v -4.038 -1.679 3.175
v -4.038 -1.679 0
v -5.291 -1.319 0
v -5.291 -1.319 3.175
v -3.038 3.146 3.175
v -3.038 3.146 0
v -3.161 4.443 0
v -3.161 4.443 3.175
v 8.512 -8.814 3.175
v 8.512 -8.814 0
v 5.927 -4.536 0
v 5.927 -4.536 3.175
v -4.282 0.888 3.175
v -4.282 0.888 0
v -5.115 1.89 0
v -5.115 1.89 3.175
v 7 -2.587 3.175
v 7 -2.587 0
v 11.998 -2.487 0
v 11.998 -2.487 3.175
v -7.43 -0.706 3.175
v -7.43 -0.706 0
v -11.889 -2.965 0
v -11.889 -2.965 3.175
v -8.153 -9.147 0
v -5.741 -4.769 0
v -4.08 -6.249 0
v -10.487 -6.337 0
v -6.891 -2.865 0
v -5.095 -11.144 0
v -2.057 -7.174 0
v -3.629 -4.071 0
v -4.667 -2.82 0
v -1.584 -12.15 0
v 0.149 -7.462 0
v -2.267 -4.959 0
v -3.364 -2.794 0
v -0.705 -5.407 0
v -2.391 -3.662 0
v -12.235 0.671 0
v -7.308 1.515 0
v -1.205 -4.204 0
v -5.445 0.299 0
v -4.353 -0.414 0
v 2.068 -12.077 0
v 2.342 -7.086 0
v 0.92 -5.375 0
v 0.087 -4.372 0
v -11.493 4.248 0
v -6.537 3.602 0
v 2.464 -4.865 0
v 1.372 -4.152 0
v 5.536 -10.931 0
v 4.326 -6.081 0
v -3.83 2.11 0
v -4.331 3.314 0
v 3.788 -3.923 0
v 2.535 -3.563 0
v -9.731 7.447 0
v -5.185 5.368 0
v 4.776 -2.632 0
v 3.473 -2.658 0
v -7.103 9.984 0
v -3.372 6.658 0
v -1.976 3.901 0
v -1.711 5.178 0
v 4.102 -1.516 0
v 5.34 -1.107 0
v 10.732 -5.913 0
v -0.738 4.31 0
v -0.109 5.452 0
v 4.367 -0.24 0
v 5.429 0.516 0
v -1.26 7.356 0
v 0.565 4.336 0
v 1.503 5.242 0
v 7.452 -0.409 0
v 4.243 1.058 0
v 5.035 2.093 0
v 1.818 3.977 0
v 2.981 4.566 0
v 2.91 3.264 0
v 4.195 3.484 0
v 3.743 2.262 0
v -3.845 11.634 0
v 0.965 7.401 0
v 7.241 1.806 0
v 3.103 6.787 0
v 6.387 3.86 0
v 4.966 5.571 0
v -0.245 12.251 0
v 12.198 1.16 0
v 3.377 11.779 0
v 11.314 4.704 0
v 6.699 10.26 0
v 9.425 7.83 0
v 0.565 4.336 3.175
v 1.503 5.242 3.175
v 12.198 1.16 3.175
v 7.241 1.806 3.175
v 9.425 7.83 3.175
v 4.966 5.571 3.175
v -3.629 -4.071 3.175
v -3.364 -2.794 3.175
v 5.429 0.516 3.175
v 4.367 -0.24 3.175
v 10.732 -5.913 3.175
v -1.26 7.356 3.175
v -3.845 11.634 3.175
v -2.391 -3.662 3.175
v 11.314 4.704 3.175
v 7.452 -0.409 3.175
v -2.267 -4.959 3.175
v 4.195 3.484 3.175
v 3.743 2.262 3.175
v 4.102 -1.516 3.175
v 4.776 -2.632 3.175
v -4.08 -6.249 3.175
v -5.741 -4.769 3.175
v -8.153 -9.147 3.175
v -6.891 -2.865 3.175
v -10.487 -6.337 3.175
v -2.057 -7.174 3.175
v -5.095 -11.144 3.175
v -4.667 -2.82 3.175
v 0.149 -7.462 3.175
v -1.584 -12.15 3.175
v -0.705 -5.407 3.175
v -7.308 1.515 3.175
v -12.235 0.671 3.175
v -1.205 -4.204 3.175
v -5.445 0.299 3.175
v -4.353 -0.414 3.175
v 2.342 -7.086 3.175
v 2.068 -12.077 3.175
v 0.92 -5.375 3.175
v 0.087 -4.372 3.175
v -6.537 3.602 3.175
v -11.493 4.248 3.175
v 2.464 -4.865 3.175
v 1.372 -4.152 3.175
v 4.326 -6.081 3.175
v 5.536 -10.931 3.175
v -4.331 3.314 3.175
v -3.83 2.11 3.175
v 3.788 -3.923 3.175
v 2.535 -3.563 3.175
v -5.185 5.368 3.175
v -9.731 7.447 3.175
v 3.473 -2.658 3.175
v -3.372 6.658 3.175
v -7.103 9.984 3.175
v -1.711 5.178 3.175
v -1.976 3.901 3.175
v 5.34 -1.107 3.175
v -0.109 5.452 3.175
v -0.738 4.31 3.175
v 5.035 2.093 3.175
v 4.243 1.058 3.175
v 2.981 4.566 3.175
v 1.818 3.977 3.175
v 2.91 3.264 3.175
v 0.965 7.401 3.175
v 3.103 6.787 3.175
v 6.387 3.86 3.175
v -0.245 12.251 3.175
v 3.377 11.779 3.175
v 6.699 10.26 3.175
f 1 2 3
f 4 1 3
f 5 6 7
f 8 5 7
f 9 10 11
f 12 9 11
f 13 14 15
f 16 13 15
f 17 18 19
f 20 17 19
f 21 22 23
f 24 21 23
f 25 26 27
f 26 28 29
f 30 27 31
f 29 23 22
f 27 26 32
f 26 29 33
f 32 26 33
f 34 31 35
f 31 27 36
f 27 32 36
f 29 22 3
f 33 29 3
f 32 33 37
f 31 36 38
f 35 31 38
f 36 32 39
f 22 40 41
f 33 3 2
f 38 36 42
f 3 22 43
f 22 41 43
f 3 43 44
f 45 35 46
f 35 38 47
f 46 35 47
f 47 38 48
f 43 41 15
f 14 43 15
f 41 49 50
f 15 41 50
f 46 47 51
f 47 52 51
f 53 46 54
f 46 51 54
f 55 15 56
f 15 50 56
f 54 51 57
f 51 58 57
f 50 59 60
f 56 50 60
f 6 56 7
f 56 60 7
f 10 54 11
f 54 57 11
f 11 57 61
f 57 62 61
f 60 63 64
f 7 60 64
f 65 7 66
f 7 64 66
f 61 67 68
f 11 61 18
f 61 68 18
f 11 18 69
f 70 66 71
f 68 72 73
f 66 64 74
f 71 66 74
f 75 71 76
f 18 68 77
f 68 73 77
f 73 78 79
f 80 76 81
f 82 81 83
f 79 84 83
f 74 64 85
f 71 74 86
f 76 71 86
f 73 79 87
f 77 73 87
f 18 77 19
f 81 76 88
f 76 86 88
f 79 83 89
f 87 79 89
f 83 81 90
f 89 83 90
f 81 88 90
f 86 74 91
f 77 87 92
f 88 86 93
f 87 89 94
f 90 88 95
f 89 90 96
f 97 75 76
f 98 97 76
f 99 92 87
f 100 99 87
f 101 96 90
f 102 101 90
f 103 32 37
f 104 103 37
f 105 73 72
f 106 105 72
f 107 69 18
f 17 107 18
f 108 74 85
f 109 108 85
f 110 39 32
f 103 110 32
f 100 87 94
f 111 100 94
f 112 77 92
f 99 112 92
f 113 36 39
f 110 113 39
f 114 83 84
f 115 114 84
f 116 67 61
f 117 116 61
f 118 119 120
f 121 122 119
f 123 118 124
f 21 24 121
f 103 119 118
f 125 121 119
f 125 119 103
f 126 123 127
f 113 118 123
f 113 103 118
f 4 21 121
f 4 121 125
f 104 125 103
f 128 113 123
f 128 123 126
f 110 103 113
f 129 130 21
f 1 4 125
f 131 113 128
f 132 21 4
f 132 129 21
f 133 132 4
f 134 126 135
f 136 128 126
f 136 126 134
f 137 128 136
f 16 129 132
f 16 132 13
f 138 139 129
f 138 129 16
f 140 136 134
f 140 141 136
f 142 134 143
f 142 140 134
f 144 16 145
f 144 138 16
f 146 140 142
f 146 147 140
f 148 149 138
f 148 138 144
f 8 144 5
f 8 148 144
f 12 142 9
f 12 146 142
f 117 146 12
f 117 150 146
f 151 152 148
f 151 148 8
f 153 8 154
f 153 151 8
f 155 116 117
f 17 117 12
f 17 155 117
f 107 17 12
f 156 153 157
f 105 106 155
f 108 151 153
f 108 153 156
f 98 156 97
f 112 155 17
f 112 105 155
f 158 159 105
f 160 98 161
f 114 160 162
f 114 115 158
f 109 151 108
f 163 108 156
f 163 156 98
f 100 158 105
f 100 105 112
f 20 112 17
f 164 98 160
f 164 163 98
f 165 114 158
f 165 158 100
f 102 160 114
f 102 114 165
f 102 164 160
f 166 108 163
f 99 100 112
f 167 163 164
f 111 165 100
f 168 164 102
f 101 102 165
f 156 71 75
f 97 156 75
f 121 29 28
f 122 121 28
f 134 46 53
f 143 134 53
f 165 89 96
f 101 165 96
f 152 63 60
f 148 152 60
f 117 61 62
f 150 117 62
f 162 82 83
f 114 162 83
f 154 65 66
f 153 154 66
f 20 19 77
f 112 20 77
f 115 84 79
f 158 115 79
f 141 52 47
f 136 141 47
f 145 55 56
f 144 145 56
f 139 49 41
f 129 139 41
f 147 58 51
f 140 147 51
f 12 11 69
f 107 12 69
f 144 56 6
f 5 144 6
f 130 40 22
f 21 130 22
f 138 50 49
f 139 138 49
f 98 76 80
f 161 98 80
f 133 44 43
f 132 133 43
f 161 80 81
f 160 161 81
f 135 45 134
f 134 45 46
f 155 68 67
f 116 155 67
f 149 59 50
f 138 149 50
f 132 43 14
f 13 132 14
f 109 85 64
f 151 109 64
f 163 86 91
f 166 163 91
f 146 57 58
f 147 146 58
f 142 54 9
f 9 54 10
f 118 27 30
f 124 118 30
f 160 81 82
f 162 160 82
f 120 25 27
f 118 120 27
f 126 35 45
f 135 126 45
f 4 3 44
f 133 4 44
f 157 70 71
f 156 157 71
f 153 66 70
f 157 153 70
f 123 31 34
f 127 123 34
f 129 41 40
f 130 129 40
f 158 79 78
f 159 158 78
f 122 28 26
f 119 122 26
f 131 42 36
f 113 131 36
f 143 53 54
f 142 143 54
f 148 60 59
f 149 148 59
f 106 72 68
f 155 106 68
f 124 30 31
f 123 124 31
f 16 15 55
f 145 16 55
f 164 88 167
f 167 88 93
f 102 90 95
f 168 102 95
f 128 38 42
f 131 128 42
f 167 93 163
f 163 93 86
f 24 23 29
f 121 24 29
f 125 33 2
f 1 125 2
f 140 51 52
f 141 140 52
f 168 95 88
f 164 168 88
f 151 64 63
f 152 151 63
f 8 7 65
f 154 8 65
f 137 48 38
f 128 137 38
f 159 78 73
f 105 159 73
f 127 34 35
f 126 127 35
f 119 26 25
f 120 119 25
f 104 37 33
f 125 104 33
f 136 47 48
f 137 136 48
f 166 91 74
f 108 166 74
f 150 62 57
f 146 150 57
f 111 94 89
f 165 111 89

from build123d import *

# Parameters (mm, degrees)
F1_DEPTH = 3.175


with BuildPart() as f1:
    # F0 (on Top) → F1 (new body)
    with BuildSketch(Plane.XY):
        Polygon((-10.4870628137, -6.3373573051), (-5.7407955294, -4.7688256549), (-4.6671820235, -2.8203893327), (-6.8913841292, -2.8648309238), align=None)
        Polygon((-8.1531831795, -9.14692233), (-4.0801120539, -6.2490892989), (-3.6285078717, -4.0707633994), (-5.7407955294, -4.7688256549), align=None)
        Polygon((-4.0801120539, -6.2490892989), (-5.0948574403, -11.1437431653), (-2.056892717, -7.174093935), (-2.267424872, -4.9594322738), align=None)
        Polygon((-0.704871222, -5.4074338266), (-2.056892717, -7.174093935), (-1.583831259, -12.1503935168), (0.1490905642, -7.461648842), align=None)
        Polygon((2.4637240027, -4.8648995948), (2.3418264946, -7.0862035045), (5.5359375832, -10.9313301636), (4.326480864, -6.0811178883), align=None)
        Polygon((3.7882219865, -3.9225703575), (4.326480864, -6.0811178883), (8.512057538, -8.8139355875), (5.9267084221, -4.5356982612), align=None)
        Polygon((4.7761198224, -2.6317035301), (5.9267084221, -4.5356982612), (10.7318438259, -5.9133841552), (7.0003219281, -2.587261939), align=None)
        Polygon((5.3396384525, -1.106998295), (7.0003219281, -2.587261939), (11.998058694, -2.4874025902), (7.4519261103, -0.4089360395), align=None)
        Polygon((5.4287067735, 0.5160685966), (7.4519261103, -0.4089360395), (12.1981933945, 1.1595956107), (7.2413939554, 1.8057256217), align=None)
        Polygon((5.0354106741, 2.0932805287), (7.2413939554, 1.8057256217), (11.314465081, 4.7035586528), (6.3874321692, 3.8599406371), align=None)
        Polygon((4.1946962388, 3.4844952996), (6.3874321692, 3.8599406371), (9.4253968924, 7.8295898674), (4.965919004, 5.5711829878), align=None)
        Polygon((2.9812646346, 4.5660973716), (4.965919004, 5.5711829878), (6.6988408272, 10.2599276626), (3.1031621427, 6.7874012813), align=None)
        Polygon((0.964675707, 7.400529185), (1.5029345845, 5.2419816542), (3.1031621427, 6.7874012813), (3.3770633571, 11.7786258601), align=None)
        Polygon((-0.2447810122, 12.2507414603), (-1.2595263986, 7.3560875939), (-0.1089377989, 5.4520928628), (0.964675707, 7.400529185), align=None)
        Polygon((-3.3718140564, 6.6580253384), (-1.7111305808, 5.1777616944), (-1.2595263986, 7.3560875939), (-3.8448755144, 11.6343249202), align=None)
        Polygon((-7.1033359542, 9.9841475546), (-5.1845012383, 5.3683683133), (-3.1612819015, 4.4433636772), (-3.3718140564, 6.6580253384), align=None)
        Polygon((-9.730633822, 7.446834864), (-6.5365227334, 3.6017082049), (-4.3305394521, 3.3141532979), (-5.1845012383, 5.3683683133), align=None)
        Polygon((-11.4933221725, 4.2478382159), (-7.3077454986, 1.5150205167), (-5.1150095682, 1.8904658542), (-6.5365227334, 3.6017082049), align=None)
        Polygon((-12.2347784104, 0.671402501), (-7.4296430067, -0.706283393), (-5.4449886373, 0.2988022231), (-7.3077454986, 1.5150205167), align=None)
        Polygon((-11.8891208951, -2.9646902726), (-6.8913841292, -2.8648309238), (-5.291156571, -1.3194112967), (-7.4296430067, -0.706283393), align=None)
        Polygon((-6.8913841292, -2.8648309238), (-4.6671820235, -2.8203893327), (-4.0380858348, -1.6786806476), (-5.291156571, -1.3194112967), align=None)
        Polygon((-5.7407955294, -4.7688256549), (-3.6285078717, -4.0707633994), (-3.3638852041, -2.794348271), (-4.6671820235, -2.8203893327), align=None)
        Polygon((-3.6285078717, -4.0707633994), (-4.0801120539, -6.2490892989), (-2.267424872, -4.9594322738), (-2.3907886109, -3.6617257877), align=None)
        Polygon((-2.267424872, -4.9594322738), (-2.056892717, -7.174093935), (-0.704871222, -5.4074338266), (-1.2052599578, -4.2037428989), align=None)
        Polygon((0.0873613318, -4.3722390058), (-0.704871222, -5.4074338266), (0.1490905642, -7.461648842), (0.9203133294, -5.3749611537), align=None)
        Polygon((0.9203133294, -5.3749611537), (0.1490905642, -7.461648842), (2.0679252801, -12.0774280832), (2.3418264946, -7.0862035045), align=None)
        Polygon((1.3722201837, -4.1522424897), (0.9203133294, -5.3749611537), (2.3418264946, -7.0862035045), (2.4637240027, -4.8648995948), align=None)
        Polygon((2.5351512503, -3.5633010067), (2.4637240027, -4.8648995948), (4.326480864, -6.0811178883), (3.7882219865, -3.9225703575), align=None)
        Polygon((3.4728230031, -2.6577445918), (3.7882219865, -3.9225703575), (5.9267084221, -4.5356982612), (4.7761198224, -2.6317035301), align=None)
        Polygon((4.1019191917, -1.5160359067), (4.7761198224, -2.6317035301), (7.0003219281, -2.587261939), (5.3396384525, -1.106998295), align=None)
        Polygon((4.3665418593, -0.2396207783), (5.3396384525, -1.106998295), (7.4519261103, -0.4089360395), (5.4287067735, 0.5160685966), align=None)
        Polygon((4.2431781203, 1.0580857079), (5.4287067735, 0.5160685966), (7.2413939554, 1.8057256217), (5.0354106741, 2.0932805287), align=None)
        Polygon((3.7427893845, 2.2617766355), (5.0354106741, 2.0932805287), (6.3874321692, 3.8599406371), (4.1946962388, 3.4844952996), align=None)
        Polygon((2.9098373869, 3.2644987835), (4.1946962388, 3.4844952996), (4.965919004, 5.5711829878), (2.9812646346, 4.5660973716), align=None)
        Polygon((1.5029345845, 5.2419816542), (1.8183335679, 3.9771558885), (2.9812646346, 4.5660973716), (3.1031621427, 6.7874012813), align=None)
        Polygon((-0.1089377989, 5.4520928628), (0.5652628318, 4.3364252394), (1.5029345845, 5.2419816542), (0.964675707, 7.400529185), align=None)
        Polygon((-1.2595263986, 7.3560875939), (-1.7111305808, 5.1777616944), (-0.7380339876, 4.3103841777), (-0.1089377989, 5.4520928628), align=None)
        Polygon((-3.1612819015, 4.4433636772), (-1.9757532484, 3.9013465659), (-1.7111305808, 5.1777616944), (-3.3718140564, 6.6580253384), align=None)
        Polygon((-5.1845012383, 5.3683683133), (-4.3305394521, 3.3141532979), (-3.0379181626, 3.145657191), (-3.1612819015, 4.4433636772), align=None)
        Polygon((-6.5365227334, 3.6017082049), (-5.1150095682, 1.8904658542), (-3.8301507163, 2.1104623702), (-4.3305394521, 3.3141532979), align=None)
        Polygon((-7.3077454986, 1.5150205167), (-5.4449886373, 0.2988022231), (-4.2820575706, 0.8877437062), (-5.1150095682, 1.8904658542), align=None)
        Polygon((-7.4296430067, -0.706283393), (-5.291156571, -1.3194112967), (-4.3534848183, -0.4138548819), (-5.4449886373, 0.2988022231), align=None)
    extrude(amount=F1_DEPTH)


solid = f1.part
